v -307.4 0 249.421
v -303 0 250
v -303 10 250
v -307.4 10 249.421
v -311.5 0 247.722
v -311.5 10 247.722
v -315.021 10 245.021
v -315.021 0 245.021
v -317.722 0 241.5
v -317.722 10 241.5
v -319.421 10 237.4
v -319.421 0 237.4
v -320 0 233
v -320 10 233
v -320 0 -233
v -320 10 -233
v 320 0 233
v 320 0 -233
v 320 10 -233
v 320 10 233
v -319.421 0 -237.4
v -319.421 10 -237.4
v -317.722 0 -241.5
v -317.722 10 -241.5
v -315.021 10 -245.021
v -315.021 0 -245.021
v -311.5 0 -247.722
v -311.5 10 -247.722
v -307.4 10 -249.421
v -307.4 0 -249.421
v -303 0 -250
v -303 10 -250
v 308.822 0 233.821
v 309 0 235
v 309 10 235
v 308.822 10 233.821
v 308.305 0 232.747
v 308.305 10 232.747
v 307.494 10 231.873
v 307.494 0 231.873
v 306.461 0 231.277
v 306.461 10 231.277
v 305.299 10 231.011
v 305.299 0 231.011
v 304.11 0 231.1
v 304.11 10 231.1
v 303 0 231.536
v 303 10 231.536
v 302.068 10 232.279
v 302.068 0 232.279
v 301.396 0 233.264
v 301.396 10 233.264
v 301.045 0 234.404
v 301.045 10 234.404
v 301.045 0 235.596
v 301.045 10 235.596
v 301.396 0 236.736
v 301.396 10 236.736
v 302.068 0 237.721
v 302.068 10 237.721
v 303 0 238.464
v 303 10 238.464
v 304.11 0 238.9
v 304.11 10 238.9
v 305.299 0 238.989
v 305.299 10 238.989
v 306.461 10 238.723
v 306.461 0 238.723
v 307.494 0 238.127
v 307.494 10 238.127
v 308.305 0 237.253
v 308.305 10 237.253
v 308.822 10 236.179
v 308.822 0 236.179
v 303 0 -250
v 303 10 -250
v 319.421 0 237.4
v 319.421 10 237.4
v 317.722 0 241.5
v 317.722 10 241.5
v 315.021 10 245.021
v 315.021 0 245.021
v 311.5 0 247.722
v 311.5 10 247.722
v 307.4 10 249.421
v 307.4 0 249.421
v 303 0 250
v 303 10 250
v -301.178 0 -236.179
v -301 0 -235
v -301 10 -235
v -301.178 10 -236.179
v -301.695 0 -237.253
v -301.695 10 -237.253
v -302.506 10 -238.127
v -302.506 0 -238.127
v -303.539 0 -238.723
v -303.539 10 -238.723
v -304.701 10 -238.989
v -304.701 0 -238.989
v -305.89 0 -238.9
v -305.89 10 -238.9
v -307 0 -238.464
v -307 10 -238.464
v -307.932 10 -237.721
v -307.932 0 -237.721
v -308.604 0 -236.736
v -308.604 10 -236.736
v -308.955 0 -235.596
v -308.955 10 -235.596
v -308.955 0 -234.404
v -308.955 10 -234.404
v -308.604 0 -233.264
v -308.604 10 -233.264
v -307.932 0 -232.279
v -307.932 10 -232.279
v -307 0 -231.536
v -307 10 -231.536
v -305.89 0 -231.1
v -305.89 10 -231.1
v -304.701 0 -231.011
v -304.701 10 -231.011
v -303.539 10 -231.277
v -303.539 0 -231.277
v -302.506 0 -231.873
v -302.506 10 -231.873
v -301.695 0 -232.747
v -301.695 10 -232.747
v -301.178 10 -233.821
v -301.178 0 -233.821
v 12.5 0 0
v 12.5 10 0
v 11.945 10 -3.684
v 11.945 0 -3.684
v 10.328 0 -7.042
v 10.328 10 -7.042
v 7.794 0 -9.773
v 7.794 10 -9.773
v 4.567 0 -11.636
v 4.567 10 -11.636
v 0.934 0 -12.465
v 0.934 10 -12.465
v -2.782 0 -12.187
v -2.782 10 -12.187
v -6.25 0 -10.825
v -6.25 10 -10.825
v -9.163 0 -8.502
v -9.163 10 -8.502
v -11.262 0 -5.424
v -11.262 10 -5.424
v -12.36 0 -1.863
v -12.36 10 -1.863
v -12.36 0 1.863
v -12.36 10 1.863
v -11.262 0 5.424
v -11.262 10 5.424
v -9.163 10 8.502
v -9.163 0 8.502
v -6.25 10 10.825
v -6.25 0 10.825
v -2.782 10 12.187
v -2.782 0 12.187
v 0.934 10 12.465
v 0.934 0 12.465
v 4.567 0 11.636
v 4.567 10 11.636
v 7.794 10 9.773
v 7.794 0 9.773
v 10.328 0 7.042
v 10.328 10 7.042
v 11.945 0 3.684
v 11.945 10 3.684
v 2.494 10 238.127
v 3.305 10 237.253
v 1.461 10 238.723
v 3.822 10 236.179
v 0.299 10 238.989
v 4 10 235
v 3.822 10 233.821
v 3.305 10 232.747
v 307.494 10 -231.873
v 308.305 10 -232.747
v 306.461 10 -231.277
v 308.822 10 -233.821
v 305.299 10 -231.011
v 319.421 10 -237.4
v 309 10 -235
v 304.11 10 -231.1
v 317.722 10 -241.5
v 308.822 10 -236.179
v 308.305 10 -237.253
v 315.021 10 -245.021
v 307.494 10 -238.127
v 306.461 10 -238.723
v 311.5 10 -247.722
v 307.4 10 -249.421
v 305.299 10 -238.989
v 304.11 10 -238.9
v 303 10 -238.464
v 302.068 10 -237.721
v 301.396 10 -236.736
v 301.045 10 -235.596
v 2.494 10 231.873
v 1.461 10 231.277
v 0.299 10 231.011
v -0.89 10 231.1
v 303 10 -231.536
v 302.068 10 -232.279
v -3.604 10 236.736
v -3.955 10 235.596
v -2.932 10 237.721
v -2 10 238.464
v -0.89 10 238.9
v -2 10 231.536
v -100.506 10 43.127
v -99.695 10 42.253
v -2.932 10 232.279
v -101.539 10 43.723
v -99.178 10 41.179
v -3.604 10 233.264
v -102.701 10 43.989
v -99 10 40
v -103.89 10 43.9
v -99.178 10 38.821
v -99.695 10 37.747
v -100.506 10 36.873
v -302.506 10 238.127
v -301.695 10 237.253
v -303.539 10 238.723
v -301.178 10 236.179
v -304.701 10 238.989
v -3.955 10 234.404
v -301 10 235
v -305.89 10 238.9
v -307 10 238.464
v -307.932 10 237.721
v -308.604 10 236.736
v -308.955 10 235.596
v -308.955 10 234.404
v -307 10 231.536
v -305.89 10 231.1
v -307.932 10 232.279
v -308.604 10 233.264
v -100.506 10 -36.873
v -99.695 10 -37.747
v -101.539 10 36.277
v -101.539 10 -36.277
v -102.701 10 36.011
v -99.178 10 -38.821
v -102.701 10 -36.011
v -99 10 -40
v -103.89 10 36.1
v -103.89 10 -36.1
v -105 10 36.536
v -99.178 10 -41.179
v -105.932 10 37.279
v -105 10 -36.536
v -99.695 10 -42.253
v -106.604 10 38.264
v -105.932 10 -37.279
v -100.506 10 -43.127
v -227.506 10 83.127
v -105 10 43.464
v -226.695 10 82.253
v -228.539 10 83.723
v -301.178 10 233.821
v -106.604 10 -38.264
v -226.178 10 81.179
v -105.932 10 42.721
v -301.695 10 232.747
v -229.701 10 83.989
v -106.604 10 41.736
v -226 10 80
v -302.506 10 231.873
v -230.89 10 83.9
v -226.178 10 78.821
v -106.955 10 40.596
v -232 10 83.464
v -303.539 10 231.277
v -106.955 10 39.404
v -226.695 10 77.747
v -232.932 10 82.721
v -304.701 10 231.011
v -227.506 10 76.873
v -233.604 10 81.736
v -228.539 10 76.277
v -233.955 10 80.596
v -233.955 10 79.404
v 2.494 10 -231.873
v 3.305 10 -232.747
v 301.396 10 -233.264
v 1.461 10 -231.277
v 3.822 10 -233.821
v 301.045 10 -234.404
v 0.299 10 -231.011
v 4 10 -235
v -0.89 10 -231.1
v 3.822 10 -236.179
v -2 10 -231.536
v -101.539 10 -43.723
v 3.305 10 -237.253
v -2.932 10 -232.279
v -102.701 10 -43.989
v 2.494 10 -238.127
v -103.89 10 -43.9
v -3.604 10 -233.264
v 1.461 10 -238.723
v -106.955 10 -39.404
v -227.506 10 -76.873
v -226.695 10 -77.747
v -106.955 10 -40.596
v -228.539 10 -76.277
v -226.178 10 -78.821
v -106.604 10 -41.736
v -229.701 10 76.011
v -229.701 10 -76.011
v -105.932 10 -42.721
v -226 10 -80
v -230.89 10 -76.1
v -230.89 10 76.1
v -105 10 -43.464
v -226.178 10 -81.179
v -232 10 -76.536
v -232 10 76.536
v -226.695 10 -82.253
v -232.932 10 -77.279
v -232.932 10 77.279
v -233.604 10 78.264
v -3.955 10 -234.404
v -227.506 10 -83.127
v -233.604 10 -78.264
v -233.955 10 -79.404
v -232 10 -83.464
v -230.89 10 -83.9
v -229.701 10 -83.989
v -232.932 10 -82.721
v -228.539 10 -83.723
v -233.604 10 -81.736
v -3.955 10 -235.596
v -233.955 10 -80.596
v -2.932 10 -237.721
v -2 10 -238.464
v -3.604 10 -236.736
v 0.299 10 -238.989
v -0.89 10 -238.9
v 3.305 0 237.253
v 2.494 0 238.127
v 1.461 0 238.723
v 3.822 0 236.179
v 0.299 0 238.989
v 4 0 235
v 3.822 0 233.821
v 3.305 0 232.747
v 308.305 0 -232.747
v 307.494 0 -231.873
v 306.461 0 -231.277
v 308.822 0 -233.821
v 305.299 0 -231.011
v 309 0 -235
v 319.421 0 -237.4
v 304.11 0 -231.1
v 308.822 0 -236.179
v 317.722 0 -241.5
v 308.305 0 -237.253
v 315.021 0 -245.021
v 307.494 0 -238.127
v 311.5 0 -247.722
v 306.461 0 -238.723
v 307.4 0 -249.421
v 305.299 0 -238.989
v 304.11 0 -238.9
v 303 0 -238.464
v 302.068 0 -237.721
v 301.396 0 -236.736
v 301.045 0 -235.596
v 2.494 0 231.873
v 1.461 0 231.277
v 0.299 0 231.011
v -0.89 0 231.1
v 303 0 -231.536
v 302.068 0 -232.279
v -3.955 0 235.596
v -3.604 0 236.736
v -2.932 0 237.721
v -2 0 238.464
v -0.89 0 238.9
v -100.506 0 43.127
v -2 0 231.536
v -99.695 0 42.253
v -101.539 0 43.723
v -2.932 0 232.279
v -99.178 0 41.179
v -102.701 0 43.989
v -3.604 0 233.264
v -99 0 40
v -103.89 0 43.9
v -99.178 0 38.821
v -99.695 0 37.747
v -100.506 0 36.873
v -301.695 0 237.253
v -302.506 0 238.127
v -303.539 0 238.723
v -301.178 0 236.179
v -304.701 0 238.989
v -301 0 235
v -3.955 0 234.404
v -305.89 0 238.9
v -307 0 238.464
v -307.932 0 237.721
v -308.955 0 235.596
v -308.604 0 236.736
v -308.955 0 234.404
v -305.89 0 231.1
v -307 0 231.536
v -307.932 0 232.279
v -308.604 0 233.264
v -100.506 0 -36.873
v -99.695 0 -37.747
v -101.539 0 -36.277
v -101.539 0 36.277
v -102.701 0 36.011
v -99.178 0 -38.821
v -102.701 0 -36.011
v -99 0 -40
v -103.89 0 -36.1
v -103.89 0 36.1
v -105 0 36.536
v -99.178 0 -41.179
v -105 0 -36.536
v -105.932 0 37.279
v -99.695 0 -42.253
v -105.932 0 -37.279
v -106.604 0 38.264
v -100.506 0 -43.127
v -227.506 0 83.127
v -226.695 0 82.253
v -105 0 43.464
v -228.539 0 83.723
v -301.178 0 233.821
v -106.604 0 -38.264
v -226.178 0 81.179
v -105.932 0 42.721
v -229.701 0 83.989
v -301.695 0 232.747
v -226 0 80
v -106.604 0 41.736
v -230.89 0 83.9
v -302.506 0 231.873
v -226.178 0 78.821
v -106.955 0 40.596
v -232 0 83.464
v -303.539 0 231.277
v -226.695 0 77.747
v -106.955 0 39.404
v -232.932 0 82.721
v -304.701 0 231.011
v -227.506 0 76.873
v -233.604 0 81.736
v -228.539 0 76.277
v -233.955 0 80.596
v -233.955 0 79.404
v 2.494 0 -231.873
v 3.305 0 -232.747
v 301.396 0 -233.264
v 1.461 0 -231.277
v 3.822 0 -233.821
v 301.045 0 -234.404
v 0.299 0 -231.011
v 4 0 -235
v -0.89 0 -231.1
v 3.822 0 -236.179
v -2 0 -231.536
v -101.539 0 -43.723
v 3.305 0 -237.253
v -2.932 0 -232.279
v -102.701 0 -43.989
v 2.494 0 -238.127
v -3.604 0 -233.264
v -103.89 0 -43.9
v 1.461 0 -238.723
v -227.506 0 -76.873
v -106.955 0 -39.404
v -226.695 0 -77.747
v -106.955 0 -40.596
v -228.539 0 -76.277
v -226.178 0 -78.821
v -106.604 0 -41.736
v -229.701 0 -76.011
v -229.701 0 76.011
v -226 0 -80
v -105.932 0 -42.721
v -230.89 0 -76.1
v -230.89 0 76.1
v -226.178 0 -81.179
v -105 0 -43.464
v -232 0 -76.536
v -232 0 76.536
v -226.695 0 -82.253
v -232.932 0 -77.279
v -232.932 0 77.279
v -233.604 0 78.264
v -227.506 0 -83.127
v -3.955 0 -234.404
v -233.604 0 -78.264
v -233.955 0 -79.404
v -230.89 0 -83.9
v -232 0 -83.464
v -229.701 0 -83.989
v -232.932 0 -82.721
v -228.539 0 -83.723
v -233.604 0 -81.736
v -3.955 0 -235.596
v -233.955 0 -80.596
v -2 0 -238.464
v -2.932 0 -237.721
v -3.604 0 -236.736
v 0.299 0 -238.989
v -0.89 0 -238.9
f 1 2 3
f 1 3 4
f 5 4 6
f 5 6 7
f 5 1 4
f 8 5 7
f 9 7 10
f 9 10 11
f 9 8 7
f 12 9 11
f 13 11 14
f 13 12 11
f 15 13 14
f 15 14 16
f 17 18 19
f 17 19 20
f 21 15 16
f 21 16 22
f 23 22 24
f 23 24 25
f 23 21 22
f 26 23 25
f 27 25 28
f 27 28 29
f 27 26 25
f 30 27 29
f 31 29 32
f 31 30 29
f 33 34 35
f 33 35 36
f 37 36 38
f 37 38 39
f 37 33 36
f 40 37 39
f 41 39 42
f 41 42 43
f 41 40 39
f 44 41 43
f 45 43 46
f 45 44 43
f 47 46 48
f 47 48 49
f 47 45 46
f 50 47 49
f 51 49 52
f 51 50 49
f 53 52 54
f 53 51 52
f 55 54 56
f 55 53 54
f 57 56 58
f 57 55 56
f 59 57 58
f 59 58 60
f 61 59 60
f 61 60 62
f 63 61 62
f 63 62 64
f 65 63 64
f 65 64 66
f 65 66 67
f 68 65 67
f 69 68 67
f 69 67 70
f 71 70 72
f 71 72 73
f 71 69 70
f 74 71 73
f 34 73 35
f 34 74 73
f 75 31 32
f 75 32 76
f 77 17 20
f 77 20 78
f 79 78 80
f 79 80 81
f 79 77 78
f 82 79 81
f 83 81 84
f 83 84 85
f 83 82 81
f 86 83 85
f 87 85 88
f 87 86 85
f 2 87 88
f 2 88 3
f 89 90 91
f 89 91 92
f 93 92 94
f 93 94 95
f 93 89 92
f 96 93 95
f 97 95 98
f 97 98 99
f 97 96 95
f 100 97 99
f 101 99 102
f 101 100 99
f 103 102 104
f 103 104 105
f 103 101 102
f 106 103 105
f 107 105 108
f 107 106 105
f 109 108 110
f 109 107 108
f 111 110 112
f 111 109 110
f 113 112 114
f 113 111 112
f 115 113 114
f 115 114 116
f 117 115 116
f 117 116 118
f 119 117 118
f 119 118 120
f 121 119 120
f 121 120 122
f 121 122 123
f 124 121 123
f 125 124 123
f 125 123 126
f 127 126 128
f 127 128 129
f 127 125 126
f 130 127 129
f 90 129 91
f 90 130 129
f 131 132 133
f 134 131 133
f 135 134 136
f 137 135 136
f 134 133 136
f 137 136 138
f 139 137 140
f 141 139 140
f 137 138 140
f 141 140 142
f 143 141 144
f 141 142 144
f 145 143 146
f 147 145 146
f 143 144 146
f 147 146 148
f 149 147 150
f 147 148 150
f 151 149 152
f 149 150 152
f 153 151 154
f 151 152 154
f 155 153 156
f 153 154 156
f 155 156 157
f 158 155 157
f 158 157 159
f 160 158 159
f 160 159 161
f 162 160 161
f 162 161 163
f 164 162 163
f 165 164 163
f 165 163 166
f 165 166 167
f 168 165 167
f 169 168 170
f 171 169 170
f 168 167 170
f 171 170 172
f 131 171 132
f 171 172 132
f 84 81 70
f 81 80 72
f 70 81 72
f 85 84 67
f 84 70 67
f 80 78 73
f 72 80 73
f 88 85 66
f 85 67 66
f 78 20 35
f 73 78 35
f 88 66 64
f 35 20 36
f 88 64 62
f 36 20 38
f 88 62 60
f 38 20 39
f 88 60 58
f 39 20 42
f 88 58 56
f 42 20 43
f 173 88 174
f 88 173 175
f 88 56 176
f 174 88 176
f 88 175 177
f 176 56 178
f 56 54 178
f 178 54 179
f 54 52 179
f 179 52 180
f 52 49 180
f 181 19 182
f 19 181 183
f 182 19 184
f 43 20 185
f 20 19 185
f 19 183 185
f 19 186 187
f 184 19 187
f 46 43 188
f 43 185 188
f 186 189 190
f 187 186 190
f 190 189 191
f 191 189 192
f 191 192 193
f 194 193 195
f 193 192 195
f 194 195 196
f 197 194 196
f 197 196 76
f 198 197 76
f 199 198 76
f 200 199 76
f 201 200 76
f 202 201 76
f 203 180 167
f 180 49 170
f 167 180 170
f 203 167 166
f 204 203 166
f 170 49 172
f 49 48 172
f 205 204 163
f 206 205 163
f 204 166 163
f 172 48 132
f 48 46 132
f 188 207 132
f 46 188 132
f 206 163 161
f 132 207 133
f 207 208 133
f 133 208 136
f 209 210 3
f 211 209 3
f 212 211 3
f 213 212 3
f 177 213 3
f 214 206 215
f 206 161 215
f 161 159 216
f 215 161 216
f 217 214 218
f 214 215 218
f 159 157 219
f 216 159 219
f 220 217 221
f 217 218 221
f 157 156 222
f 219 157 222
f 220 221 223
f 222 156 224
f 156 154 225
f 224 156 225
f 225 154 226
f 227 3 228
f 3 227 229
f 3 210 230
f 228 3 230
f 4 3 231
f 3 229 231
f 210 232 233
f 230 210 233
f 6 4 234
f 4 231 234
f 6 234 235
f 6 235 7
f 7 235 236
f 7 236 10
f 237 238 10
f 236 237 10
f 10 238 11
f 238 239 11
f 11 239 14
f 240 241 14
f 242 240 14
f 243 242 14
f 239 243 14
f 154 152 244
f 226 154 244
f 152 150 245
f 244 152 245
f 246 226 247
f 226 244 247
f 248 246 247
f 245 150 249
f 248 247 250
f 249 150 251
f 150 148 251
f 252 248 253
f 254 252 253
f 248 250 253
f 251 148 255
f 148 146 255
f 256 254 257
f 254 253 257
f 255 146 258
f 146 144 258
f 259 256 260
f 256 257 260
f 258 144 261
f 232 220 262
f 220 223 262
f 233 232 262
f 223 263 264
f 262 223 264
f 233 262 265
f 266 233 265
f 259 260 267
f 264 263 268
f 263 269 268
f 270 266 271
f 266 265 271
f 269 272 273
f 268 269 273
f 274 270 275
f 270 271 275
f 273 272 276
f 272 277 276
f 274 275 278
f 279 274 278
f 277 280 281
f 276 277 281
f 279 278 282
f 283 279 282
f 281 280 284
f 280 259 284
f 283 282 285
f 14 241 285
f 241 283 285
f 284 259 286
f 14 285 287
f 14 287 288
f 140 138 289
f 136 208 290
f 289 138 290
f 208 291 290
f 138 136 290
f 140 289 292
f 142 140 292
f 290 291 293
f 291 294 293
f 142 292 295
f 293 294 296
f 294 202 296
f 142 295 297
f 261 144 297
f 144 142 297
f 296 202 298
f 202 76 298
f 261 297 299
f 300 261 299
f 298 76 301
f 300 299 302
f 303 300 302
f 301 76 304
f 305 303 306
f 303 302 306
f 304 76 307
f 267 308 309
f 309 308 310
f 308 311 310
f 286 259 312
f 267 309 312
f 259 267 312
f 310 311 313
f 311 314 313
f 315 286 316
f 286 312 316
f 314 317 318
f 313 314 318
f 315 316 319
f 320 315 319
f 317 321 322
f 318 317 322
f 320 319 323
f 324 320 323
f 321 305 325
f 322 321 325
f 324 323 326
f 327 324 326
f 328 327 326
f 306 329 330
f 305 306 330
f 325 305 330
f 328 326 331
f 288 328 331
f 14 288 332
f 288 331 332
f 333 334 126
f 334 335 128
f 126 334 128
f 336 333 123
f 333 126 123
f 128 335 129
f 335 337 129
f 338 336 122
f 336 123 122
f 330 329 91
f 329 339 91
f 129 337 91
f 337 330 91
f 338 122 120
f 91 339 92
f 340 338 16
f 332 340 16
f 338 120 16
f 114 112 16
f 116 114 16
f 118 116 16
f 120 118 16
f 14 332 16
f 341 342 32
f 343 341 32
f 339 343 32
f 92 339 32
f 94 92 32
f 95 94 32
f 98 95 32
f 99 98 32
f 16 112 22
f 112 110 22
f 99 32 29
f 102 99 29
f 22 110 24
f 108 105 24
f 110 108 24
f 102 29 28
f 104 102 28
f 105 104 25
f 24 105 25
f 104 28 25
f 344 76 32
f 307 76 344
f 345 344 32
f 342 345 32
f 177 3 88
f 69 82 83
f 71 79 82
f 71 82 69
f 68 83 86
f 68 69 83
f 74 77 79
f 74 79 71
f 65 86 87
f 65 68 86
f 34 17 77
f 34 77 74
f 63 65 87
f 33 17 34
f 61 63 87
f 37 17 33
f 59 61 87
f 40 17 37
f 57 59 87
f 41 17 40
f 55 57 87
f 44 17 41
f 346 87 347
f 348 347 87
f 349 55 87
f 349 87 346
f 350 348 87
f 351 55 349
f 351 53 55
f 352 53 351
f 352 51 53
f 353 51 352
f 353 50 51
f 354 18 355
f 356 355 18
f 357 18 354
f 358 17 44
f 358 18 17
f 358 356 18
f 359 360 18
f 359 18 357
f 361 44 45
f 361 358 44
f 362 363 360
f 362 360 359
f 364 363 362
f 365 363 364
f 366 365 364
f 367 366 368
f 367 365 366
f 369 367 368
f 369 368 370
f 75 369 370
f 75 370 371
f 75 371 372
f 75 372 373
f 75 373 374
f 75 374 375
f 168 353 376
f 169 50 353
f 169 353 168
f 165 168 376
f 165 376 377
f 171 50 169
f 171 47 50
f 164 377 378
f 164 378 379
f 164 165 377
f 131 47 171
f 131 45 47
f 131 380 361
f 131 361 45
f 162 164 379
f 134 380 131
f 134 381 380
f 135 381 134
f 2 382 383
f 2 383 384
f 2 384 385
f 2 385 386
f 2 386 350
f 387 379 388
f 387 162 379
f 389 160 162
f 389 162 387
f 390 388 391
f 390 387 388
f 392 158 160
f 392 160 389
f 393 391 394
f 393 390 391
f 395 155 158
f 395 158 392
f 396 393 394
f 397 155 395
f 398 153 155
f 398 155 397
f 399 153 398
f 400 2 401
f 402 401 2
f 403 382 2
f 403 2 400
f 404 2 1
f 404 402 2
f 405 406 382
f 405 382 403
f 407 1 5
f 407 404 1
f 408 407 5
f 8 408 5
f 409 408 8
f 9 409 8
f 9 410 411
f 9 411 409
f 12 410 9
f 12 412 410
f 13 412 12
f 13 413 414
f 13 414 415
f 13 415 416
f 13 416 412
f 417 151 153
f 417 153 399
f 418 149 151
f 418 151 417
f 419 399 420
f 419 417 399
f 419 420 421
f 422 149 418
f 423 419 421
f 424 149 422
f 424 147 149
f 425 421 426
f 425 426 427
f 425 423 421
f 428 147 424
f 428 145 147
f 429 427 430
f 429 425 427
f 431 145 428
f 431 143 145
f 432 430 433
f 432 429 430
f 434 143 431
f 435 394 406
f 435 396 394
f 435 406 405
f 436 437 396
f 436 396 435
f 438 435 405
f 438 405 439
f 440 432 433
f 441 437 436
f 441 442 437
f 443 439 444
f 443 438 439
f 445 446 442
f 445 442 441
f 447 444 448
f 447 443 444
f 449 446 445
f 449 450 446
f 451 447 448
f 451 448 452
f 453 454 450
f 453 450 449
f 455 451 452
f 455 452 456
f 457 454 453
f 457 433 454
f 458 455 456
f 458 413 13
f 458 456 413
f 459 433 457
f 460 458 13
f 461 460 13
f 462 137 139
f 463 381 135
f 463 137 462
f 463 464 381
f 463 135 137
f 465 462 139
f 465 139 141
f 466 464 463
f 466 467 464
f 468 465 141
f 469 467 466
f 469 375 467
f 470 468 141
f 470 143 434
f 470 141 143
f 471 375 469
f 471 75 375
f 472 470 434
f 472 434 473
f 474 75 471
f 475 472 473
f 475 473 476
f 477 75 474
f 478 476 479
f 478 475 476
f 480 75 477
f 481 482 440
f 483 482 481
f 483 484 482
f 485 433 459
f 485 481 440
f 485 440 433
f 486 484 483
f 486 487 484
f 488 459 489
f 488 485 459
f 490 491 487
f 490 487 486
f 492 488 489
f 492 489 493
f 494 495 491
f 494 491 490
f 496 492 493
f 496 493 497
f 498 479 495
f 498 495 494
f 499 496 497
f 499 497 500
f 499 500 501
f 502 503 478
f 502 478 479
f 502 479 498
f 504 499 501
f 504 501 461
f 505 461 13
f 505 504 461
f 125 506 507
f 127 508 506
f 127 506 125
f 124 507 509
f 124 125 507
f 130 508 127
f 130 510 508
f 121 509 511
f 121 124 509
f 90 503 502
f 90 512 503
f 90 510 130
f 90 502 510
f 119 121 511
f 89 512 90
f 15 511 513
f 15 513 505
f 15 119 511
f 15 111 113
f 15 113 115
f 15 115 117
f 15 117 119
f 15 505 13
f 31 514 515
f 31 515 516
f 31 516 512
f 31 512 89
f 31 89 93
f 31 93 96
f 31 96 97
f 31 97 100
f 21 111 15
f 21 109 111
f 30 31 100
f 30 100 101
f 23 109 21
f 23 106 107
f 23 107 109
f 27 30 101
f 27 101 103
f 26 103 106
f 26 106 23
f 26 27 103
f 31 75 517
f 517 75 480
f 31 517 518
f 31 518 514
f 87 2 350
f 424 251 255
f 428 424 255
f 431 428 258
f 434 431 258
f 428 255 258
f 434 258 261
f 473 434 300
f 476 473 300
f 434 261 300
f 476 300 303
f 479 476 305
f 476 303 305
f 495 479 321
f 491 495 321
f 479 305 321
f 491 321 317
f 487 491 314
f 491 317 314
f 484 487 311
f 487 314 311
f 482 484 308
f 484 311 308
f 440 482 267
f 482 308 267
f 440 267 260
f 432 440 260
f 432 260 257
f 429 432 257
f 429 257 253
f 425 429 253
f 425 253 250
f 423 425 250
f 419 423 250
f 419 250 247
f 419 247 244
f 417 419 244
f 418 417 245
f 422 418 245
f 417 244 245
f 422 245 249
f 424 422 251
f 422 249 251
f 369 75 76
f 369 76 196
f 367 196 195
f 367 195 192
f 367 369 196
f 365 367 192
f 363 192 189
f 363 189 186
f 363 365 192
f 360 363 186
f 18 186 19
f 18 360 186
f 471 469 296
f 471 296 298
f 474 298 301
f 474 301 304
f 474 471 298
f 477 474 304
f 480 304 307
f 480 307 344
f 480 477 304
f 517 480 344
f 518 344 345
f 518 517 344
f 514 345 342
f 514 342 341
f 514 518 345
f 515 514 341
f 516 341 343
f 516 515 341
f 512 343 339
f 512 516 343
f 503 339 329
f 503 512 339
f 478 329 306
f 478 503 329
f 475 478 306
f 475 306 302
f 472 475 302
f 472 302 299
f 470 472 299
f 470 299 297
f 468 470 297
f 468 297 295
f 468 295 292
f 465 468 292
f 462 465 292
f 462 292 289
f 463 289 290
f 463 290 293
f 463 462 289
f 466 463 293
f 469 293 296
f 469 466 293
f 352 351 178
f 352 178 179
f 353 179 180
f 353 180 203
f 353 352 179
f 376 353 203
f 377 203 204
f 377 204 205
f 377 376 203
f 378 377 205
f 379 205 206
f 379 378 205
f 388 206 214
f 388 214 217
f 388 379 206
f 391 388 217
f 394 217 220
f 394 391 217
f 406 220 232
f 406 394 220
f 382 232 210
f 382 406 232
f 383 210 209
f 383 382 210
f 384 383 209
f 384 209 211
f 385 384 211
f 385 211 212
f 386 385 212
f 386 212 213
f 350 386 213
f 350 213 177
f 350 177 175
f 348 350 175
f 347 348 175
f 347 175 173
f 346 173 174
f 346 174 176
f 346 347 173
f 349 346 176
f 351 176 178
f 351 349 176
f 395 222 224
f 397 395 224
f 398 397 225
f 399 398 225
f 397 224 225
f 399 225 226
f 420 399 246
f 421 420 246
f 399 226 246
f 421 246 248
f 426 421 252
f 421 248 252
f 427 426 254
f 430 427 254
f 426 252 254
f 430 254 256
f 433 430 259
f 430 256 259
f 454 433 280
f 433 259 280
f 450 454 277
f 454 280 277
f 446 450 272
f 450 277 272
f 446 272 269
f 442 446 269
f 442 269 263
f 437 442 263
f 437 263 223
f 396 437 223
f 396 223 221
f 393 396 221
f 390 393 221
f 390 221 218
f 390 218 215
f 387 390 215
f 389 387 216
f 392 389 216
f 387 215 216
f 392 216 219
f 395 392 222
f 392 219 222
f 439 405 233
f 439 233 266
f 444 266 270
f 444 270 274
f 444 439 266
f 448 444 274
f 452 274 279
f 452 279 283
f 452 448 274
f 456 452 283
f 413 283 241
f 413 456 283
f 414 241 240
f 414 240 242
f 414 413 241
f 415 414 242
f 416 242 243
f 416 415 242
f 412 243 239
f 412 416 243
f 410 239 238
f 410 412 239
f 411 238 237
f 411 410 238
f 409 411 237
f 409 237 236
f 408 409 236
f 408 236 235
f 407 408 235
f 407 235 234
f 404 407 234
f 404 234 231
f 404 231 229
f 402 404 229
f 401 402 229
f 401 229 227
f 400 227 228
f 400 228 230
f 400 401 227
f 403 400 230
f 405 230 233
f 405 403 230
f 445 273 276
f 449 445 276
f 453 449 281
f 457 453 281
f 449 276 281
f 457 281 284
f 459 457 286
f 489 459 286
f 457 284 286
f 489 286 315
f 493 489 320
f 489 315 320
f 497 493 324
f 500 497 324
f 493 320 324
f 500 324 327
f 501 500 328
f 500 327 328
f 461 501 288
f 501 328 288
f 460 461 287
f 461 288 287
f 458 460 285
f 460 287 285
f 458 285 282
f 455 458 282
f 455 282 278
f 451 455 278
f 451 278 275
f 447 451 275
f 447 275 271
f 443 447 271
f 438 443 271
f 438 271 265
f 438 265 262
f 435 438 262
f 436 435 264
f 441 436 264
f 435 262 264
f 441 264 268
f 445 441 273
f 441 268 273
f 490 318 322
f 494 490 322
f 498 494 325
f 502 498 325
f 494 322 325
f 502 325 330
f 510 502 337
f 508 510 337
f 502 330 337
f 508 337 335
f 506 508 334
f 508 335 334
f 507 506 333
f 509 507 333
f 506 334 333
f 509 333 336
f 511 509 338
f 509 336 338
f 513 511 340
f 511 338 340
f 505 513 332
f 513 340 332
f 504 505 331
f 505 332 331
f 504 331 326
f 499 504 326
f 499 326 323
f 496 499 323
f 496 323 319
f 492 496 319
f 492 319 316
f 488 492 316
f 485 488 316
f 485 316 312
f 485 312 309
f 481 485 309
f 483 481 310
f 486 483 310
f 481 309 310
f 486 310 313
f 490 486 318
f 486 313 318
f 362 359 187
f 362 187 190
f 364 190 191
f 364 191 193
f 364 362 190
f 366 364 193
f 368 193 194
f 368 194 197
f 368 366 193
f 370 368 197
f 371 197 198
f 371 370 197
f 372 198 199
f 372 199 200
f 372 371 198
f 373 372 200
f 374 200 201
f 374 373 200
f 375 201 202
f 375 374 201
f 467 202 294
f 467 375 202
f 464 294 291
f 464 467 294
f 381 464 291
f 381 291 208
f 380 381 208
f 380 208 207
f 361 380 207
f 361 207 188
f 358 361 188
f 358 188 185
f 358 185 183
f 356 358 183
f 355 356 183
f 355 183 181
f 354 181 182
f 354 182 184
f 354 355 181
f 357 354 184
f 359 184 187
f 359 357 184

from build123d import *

# Parameters (mm, degrees)
CROQUIS1_R              = 4
SALIENTE_EXTRUIR1_DEPTH = 10
CROQUIS2_R              = 4
CROQUIS2_R_2            = 12.5
CORTAR_EXTRUIR1_DEPTH   = 10


with BuildPart() as part:
    # Croquis1 → Saliente-Extruir1 (new body)
    with BuildSketch(Plane(origin=(0, 0, 0), x_dir=(1, 0, 0), z_dir=(0, 1, 0))):
        with BuildLine():
            Line((-303, 250), (303, 250))
            ThreePointArc((303, 250), (315.02081528, 245.02081528), (320, 233))
            Line((320, 233), (320, -233))
            ThreePointArc((320, -233), (315.02081528, -245.02081528), (303, -250))
            Line((303, -250), (-303, -250))
            ThreePointArc((-303, -250), (-315.02081528, -245.02081528), (-320, -233))
            Line((-320, -233), (-320, 233))
            ThreePointArc((-320, 233), (-315.02081528, 245.02081528), (-303, 250))
        make_face()
        with Locations((0, 235)):
            Circle(CROQUIS1_R, mode=Mode.SUBTRACT)
        with Locations((305, 235)):
            Circle(CROQUIS1_R, mode=Mode.SUBTRACT)
        with Locations((-305, 235)):
            Circle(CROQUIS1_R, mode=Mode.SUBTRACT)
        with Locations((0, -235)):
            Circle(CROQUIS1_R, mode=Mode.SUBTRACT)
        with Locations((305, -235)):
            Circle(CROQUIS1_R, mode=Mode.SUBTRACT)
        with Locations((-305, -235)):
            Circle(CROQUIS1_R, mode=Mode.SUBTRACT)
    extrude(amount=SALIENTE_EXTRUIR1_DEPTH)

    # Croquis2 → Cortar-Extruir1 (cut)
    with BuildSketch(Plane(origin=(0, 10, 0), x_dir=(1, 0, 0), z_dir=(0, 1, 0))):
        with Locations((-230, 80)):
            Circle(CROQUIS2_R)
        with Locations((-103, 40)):
            Circle(CROQUIS2_R)
        Circle(CROQUIS2_R_2)
        with Locations((-103, -40)):
            Circle(CROQUIS2_R)
        with Locations((-230, -80)):
            Circle(CROQUIS2_R)
    extrude(amount=-CORTAR_EXTRUIR1_DEPTH, mode=Mode.SUBTRACT)


solid = part.part
